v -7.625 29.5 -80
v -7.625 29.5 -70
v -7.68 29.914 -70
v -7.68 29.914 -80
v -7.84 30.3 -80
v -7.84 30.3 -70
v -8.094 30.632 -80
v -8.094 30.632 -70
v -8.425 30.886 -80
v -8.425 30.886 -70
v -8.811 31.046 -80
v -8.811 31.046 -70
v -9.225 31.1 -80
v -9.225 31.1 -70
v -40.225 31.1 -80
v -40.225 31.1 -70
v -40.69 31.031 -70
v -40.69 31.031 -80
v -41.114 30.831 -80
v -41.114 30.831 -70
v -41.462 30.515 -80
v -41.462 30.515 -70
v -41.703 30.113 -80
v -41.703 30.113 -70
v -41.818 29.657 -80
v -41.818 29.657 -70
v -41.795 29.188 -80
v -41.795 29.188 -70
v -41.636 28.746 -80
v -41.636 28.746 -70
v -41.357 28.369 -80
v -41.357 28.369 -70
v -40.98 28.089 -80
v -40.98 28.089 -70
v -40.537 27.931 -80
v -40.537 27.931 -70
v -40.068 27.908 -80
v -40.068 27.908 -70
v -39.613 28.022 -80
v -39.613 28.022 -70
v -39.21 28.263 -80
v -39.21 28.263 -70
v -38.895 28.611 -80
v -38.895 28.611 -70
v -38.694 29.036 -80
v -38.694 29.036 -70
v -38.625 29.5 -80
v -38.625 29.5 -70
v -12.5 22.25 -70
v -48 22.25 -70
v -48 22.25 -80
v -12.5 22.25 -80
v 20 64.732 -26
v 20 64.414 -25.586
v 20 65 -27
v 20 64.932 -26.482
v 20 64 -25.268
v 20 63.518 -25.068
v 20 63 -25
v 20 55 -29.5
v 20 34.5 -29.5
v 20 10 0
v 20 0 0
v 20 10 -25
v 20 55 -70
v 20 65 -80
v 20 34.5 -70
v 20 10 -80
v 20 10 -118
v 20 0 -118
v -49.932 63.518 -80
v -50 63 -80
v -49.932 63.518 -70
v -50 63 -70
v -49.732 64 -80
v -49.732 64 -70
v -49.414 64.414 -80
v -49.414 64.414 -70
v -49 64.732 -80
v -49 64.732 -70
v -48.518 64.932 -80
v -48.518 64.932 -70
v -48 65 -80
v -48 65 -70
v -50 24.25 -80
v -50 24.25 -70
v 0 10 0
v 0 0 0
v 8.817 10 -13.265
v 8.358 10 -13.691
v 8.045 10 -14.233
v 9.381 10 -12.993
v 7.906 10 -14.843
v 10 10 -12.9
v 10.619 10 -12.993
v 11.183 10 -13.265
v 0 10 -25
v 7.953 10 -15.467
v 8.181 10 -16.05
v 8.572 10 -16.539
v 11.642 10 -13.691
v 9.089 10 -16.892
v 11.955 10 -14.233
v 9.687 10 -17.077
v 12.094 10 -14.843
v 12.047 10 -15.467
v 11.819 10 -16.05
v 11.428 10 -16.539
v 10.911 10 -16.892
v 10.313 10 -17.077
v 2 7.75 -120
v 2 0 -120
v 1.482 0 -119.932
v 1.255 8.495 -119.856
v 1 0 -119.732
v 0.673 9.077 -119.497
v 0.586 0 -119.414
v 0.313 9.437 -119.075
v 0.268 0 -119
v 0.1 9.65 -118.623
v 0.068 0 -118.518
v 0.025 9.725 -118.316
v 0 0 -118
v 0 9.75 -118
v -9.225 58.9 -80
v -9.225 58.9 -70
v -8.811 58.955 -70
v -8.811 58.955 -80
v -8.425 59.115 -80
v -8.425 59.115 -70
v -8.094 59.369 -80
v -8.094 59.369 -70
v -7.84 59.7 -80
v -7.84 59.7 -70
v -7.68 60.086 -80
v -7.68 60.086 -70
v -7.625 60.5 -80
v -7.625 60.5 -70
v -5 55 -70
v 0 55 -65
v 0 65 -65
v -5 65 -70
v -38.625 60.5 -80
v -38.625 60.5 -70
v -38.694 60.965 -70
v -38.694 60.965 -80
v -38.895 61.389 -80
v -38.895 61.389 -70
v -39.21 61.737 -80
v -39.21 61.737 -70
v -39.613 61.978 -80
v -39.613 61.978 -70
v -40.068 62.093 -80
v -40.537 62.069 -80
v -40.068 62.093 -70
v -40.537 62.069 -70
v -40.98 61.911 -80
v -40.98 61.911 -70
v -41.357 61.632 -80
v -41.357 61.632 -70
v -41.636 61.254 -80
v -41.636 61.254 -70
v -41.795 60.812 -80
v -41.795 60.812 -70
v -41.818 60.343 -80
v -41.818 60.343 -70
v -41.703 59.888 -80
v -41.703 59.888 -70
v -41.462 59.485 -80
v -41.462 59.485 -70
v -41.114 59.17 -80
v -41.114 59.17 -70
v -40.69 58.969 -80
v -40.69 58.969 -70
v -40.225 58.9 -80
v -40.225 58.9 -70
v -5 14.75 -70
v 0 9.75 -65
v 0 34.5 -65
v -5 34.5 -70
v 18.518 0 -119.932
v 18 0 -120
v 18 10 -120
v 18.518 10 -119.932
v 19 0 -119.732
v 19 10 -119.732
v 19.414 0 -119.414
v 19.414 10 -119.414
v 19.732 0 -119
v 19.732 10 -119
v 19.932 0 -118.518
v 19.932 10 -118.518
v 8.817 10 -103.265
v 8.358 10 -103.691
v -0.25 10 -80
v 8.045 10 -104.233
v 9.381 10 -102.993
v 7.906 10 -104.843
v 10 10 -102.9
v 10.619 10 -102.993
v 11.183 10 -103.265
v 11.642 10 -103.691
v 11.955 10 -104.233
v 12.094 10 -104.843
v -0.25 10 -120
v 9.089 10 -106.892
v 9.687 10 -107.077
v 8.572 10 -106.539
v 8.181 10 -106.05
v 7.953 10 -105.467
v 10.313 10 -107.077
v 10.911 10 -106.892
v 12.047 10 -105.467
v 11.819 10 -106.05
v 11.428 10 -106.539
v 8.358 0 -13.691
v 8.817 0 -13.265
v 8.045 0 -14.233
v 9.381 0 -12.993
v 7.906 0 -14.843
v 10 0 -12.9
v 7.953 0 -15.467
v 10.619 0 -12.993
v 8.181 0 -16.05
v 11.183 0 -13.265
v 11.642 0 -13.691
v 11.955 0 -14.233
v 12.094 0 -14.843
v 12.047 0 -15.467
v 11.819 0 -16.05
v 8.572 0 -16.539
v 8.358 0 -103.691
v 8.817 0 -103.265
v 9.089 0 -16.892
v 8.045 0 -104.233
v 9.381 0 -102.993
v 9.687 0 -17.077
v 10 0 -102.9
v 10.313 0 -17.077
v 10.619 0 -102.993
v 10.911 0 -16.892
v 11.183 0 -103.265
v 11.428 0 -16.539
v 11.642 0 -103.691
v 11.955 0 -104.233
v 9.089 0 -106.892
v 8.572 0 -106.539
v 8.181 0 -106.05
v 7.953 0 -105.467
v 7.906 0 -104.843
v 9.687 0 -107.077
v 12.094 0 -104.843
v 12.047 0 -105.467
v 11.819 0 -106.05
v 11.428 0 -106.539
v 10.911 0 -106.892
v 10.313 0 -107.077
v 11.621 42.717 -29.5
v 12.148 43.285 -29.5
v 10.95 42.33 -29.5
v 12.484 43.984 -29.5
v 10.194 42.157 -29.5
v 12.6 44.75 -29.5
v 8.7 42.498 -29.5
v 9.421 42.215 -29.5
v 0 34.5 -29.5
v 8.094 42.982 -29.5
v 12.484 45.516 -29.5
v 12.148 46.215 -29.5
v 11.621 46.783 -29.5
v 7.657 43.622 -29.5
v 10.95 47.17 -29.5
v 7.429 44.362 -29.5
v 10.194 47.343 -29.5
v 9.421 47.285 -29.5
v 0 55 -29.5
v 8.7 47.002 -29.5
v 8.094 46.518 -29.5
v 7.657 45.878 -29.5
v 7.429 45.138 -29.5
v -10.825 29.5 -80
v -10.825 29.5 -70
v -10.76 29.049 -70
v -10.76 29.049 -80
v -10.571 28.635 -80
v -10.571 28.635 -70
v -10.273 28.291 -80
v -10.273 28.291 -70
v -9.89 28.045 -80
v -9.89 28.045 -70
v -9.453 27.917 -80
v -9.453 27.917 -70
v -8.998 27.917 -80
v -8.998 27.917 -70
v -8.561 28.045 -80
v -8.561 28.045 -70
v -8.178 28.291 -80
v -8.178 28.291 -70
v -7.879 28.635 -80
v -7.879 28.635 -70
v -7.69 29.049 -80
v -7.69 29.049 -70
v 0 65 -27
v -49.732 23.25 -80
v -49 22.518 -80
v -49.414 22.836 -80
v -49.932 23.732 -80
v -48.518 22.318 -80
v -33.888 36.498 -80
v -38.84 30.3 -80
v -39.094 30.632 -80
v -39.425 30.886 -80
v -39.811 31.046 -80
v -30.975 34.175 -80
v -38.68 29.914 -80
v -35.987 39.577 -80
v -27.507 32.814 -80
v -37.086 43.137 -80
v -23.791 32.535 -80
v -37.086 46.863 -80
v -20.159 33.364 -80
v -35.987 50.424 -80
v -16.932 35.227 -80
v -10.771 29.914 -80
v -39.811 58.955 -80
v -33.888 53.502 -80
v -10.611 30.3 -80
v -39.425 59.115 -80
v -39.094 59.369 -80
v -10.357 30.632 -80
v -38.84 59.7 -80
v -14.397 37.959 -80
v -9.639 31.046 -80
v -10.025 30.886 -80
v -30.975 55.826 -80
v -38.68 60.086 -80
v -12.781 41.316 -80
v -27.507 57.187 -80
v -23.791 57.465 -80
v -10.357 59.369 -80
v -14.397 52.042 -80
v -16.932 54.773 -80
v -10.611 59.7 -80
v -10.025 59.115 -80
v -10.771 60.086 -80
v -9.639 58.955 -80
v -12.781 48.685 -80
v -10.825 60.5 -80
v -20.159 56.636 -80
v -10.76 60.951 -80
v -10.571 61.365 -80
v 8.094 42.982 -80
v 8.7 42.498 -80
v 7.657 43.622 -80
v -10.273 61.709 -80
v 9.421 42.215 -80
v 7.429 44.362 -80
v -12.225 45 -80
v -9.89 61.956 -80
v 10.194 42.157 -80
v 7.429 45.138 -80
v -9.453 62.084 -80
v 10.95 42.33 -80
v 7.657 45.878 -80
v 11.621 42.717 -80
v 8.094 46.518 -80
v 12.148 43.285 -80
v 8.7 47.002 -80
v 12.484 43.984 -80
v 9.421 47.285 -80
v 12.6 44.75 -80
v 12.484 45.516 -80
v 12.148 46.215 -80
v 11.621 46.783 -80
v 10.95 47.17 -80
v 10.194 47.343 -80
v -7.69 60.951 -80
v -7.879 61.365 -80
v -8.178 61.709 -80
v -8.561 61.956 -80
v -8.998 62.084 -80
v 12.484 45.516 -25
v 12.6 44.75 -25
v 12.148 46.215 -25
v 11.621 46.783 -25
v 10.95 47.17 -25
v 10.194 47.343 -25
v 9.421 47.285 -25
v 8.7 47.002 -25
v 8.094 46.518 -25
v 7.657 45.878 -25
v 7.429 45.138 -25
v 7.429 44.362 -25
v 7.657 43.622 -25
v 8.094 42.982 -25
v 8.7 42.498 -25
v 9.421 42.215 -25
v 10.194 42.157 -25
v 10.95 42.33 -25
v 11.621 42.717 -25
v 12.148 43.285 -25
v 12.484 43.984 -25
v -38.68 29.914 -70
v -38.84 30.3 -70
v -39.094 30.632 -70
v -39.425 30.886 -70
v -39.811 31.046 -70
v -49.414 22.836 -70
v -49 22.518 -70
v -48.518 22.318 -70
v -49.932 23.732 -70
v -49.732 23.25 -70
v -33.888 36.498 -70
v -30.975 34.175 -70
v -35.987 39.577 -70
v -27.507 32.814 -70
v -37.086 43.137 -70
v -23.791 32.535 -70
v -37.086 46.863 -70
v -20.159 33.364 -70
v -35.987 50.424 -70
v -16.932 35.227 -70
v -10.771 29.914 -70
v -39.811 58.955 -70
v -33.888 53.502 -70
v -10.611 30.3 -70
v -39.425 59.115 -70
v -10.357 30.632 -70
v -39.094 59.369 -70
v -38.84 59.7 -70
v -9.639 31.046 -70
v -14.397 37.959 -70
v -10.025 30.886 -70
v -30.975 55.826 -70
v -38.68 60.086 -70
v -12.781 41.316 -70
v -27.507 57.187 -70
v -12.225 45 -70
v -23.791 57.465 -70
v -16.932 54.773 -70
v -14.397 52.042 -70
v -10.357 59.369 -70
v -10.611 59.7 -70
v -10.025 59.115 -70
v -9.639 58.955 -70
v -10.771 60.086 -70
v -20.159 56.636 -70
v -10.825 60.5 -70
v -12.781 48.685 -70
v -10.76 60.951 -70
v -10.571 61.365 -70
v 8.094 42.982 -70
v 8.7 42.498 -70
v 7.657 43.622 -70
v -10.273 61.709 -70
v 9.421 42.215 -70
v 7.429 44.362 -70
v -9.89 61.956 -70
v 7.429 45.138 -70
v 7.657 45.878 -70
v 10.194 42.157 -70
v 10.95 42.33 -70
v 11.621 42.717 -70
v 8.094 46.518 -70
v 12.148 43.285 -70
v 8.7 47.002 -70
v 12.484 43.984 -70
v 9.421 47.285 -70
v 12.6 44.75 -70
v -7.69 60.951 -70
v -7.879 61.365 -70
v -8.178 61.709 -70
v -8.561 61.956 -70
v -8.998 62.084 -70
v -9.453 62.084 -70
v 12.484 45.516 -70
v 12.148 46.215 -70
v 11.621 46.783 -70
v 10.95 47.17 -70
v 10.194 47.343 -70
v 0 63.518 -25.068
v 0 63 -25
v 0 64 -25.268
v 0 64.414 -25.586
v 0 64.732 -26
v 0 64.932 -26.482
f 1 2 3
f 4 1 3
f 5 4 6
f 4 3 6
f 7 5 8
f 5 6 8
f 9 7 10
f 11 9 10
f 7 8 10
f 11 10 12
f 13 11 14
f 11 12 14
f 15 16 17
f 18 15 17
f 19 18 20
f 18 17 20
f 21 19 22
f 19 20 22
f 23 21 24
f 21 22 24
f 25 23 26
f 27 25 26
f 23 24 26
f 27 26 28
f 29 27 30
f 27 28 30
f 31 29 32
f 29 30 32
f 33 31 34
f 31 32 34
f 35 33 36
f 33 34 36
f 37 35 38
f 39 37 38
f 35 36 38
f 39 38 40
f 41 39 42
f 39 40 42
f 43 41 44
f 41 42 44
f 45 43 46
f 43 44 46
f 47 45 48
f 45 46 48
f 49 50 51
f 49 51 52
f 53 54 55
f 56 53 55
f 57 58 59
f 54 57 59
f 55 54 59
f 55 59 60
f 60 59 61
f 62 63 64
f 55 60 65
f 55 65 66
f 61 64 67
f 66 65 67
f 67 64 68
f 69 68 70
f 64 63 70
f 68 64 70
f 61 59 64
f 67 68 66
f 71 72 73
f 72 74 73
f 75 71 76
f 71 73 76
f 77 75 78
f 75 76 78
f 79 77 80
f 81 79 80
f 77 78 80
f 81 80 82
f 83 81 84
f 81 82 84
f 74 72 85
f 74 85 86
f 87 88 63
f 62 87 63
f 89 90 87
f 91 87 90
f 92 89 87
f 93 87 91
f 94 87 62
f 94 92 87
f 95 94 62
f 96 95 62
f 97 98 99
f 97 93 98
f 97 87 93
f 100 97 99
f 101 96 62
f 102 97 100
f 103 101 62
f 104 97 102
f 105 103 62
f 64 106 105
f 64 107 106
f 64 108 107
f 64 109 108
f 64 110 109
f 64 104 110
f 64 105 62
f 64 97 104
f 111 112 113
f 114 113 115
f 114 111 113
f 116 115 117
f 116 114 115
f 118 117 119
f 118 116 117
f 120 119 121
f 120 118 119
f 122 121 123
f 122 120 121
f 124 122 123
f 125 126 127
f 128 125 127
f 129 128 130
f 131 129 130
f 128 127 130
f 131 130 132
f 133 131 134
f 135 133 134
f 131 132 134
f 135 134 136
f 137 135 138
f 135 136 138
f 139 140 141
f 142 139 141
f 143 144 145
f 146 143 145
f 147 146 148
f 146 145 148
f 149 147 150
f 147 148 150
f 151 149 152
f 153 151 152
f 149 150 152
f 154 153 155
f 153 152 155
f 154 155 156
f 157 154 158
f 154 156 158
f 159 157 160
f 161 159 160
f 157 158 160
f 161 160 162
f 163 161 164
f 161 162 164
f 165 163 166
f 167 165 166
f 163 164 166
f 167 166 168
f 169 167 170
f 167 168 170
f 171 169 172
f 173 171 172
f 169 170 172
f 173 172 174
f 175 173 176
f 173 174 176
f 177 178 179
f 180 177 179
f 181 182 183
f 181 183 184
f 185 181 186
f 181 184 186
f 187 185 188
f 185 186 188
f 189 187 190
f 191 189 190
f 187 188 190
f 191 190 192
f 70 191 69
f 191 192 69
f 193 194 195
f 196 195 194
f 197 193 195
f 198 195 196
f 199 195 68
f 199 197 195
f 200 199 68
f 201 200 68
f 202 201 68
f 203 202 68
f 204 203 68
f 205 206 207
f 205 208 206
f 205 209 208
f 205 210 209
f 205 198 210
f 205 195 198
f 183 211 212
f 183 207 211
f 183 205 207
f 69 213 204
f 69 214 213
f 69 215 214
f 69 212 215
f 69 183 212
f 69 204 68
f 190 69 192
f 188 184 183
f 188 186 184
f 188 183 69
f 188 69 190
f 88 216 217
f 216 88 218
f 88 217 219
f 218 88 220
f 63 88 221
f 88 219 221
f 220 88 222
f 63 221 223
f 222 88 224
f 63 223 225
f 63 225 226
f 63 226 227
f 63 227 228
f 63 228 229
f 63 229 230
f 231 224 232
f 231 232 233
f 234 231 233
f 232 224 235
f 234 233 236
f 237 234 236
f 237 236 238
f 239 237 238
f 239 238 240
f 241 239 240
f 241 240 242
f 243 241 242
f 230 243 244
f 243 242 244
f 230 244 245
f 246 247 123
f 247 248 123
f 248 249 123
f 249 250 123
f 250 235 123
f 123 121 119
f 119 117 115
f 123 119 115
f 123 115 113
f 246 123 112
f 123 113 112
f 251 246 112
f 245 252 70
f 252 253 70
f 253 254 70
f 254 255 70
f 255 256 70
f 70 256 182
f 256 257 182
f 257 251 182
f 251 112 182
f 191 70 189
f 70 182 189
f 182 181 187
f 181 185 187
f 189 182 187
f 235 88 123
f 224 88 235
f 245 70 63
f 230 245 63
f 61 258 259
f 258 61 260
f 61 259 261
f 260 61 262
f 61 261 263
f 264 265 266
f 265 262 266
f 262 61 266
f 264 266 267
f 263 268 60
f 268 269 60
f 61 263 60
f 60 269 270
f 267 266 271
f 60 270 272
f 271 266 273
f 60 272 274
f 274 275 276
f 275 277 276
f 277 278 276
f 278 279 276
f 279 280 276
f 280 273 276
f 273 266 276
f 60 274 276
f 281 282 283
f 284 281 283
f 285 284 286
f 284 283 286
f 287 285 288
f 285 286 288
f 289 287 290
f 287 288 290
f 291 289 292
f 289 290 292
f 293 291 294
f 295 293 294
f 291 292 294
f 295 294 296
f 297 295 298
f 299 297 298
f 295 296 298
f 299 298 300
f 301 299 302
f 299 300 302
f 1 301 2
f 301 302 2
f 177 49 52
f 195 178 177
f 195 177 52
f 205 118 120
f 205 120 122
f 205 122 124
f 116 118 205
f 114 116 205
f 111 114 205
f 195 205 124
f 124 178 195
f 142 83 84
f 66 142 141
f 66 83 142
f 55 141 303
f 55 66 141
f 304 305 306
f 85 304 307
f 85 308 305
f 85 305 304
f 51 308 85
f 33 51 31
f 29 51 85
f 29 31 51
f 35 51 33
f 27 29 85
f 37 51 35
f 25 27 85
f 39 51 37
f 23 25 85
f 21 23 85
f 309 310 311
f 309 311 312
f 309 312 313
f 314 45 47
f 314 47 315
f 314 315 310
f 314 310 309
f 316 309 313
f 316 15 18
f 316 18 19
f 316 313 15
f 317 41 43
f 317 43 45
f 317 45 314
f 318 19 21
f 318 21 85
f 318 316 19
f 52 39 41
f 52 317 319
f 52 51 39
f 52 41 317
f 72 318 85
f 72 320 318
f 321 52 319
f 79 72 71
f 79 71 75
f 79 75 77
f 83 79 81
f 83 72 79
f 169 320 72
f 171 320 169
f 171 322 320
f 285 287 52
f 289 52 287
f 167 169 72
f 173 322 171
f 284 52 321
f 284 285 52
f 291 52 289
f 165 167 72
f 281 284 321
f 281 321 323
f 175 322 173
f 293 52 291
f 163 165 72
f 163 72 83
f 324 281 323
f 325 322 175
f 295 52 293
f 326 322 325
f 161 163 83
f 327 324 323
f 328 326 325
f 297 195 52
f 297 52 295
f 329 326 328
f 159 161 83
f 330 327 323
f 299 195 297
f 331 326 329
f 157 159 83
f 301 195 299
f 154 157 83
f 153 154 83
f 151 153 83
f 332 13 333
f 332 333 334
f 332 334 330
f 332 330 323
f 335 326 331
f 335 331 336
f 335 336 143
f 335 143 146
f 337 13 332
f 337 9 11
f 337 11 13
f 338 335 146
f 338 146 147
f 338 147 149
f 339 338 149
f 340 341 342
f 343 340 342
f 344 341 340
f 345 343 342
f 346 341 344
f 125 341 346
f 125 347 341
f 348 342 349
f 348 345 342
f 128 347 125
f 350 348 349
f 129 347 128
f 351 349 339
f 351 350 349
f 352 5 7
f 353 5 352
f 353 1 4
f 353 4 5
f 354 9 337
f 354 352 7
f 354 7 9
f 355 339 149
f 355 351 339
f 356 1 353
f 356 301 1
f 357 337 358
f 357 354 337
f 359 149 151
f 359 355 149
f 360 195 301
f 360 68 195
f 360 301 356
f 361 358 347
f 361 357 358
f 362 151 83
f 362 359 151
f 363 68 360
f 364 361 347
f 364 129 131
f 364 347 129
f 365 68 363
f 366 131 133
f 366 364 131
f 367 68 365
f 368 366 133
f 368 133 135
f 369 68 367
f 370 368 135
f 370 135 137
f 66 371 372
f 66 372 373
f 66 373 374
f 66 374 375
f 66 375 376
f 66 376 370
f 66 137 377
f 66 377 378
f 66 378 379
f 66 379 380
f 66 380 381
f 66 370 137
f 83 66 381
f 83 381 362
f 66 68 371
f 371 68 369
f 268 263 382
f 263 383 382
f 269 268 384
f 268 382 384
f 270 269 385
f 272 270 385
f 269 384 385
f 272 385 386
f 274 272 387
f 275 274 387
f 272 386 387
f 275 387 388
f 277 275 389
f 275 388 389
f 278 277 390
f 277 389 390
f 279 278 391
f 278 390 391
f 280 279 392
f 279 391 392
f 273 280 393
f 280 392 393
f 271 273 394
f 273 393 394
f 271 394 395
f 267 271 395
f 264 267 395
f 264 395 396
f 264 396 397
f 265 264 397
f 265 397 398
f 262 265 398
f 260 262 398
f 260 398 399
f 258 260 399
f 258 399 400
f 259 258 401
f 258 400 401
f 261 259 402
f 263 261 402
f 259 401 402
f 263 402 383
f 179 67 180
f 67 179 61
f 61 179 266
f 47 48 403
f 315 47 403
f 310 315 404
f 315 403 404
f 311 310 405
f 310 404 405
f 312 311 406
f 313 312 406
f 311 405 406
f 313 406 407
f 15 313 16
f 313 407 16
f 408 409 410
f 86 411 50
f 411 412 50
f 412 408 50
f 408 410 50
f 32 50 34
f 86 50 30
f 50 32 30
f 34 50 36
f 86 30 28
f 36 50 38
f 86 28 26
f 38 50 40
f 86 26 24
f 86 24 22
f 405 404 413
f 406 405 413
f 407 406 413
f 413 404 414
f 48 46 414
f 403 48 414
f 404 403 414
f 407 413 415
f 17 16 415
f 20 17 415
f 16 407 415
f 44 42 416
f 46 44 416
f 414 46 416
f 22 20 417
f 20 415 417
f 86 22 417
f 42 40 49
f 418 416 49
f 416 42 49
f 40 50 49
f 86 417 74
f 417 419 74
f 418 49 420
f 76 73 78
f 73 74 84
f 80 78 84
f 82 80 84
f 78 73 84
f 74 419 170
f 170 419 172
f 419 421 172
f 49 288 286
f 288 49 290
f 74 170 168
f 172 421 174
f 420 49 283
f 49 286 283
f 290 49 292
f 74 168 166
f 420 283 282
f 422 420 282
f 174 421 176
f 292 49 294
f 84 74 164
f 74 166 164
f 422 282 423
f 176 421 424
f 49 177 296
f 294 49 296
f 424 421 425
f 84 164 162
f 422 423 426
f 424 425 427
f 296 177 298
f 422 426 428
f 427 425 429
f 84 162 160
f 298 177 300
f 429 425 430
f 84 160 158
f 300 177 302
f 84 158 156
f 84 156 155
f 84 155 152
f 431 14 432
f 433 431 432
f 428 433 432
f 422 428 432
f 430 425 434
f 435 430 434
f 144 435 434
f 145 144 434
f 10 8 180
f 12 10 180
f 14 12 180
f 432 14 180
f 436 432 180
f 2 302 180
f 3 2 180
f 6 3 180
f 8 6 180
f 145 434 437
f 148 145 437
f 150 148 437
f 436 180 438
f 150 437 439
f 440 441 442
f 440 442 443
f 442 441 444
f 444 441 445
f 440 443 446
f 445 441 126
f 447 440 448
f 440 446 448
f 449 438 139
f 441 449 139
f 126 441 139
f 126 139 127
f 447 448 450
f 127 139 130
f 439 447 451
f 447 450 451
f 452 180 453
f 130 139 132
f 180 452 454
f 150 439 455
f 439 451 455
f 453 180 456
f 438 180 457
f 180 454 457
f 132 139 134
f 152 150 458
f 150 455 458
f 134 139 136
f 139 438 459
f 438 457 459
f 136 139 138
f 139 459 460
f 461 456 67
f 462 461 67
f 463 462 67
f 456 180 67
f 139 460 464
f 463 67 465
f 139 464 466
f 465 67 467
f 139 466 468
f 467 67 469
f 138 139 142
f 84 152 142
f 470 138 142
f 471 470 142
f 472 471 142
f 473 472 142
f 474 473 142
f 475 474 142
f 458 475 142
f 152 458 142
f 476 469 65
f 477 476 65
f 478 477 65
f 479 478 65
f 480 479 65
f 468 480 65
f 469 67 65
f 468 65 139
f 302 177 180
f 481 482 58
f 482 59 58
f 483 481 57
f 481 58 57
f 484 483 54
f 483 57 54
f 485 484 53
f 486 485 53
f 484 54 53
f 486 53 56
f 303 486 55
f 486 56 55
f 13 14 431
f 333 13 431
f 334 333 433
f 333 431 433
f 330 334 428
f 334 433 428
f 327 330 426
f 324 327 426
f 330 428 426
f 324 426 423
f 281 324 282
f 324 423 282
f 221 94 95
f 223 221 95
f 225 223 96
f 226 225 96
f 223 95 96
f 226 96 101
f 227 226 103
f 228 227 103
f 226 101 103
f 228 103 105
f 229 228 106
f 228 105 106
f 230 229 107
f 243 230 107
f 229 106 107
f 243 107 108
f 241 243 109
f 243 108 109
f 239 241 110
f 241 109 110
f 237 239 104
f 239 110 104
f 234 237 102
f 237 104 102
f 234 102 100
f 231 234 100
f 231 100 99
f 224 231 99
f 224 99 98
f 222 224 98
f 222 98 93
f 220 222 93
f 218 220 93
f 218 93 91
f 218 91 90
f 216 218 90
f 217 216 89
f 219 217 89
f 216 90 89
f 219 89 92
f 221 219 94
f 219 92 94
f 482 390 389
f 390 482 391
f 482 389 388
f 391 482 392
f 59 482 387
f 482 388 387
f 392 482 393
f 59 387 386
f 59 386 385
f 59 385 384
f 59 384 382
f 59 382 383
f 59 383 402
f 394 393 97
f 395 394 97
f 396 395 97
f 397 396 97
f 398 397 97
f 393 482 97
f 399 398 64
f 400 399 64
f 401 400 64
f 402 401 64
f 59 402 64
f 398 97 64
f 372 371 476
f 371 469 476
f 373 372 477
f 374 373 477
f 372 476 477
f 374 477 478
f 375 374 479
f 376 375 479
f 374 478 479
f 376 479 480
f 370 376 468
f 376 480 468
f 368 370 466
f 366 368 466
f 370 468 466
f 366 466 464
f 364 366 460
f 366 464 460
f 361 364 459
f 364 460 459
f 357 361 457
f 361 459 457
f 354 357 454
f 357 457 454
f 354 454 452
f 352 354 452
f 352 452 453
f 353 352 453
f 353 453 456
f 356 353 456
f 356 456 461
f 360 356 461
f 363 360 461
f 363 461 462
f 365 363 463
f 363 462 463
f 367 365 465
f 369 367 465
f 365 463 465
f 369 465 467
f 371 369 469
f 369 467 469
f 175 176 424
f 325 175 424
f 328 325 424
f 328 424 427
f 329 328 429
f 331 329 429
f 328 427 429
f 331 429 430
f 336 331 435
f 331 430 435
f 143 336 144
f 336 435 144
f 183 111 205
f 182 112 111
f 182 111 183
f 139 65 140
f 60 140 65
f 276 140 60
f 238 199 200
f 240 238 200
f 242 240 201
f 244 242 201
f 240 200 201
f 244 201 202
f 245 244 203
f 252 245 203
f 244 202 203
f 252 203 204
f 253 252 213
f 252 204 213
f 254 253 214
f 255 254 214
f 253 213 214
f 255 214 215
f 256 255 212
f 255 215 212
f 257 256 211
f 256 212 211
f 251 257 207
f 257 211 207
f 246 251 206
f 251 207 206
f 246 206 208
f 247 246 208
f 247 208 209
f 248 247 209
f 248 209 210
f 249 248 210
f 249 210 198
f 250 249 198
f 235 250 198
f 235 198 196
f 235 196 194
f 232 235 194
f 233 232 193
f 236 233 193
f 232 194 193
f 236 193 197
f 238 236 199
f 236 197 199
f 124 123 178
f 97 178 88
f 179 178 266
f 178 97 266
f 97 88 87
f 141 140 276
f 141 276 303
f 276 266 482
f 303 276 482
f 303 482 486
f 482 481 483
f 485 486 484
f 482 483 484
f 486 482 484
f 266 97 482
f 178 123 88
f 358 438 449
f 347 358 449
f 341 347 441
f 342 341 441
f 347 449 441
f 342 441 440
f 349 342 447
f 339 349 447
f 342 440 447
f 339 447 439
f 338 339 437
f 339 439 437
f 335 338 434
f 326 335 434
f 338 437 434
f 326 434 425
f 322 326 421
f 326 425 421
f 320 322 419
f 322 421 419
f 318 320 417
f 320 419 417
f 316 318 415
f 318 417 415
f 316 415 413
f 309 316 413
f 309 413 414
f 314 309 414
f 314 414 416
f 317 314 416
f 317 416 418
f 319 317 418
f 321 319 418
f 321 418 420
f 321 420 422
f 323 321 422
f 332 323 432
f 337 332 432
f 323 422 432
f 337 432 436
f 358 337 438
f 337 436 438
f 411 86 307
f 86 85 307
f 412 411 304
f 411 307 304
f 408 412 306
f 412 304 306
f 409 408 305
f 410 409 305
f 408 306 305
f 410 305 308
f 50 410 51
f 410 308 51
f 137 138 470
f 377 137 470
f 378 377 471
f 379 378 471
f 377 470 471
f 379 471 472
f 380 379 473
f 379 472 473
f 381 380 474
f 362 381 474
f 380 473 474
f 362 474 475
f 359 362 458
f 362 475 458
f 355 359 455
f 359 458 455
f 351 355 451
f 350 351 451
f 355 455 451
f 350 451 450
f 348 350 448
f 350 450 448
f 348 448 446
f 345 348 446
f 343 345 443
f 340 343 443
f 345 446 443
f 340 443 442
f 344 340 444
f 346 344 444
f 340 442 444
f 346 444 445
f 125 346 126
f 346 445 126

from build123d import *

# Parameters (mm, degrees)
SKETCH4_W           = 20
SKETCH4_H           = 120
BOSS_EXTRUDE4_DEPTH = 10
SKETCH5_R           = 2.1
CUT_EXTRUDE1_DEPTH  = 10
SKETCH8_W           = 20
SKETCH8_H           = 55
BOSS_EXTRUDE6_DEPTH = 55
SKETCH9_W           = 40.5
SKETCH9_H           = 20.5
CUT_EXTRUDE2_DEPTH  = 20
SKETCH11_R          = 2.6
CUT_EXTRUDE3_DEPTH  = 50
SKETCH12_W          = 10
SKETCH12_H          = 55
BOSS_EXTRUDE7_DEPTH = 50
SKETCH15_R          = 12.5
CUT_EXTRUDE4_DEPTH  = 10
SKETCH17_W          = 50
SKETCH17_H          = 12.25
CUT_EXTRUDE6_DEPTH  = 10
CHAMFER1_SIZE       = 12.5
FILLET1_R           = 2
CHAMFER2_SIZE       = 5


with BuildPart() as part:
    # Sketch4 → Boss-Extrude4 (new body)
    with BuildSketch(Plane(origin=(0, 0, 0), x_dir=(1, 0, 0), z_dir=(0, 1, 0))):
        with Locations((10, 60)):
            Rectangle(SKETCH4_W, SKETCH4_H)
    extrude(amount=BOSS_EXTRUDE4_DEPTH)

    # Sketch5 → Cut-Extrude1 (cut)
    with BuildSketch(Plane(origin=(0, 10, 0), x_dir=(1, 0, 0), z_dir=(0, 1, 0))):
        with Locations(Location((10, 105, 0), (0, 0, 270))):
            Circle(SKETCH5_R)
        with Locations(Location((10, 15, 0), (0, 0, 270))):
            Circle(SKETCH5_R)
    extrude(amount=-CUT_EXTRUDE1_DEPTH, mode=Mode.SUBTRACT)

    # Sketch8 → Boss-Extrude6 (add)
    with BuildSketch(Plane(origin=(0, 10, 0), x_dir=(1, 0, 0), z_dir=(0, 1, 0))):
        with Locations((10, 52.5)):
            Rectangle(SKETCH8_W, SKETCH8_H)
    extrude(amount=BOSS_EXTRUDE6_DEPTH)

    # Sketch9 → Cut-Extrude2 (cut)
    with BuildSketch(Plane.ZY):
        with Locations((-49.75, 44.75)):
            Rectangle(SKETCH9_W, SKETCH9_H)
    extrude(amount=-CUT_EXTRUDE2_DEPTH, mode=Mode.SUBTRACT)

    # Sketch11 → Cut-Extrude3 (cut, symmetric)
    with BuildSketch(Plane.XY.offset(-70)):
        with Locations((10, 44.75)):
            Circle(SKETCH11_R)
    extrude(amount=CUT_EXTRUDE3_DEPTH, both=True, mode=Mode.SUBTRACT)

    # Sketch12 → Boss-Extrude7 (add)
    with BuildSketch(Plane.ZY):
        with Locations((-75, 37.5)):
            Rectangle(SKETCH12_W, SKETCH12_H)
    extrude(amount=BOSS_EXTRUDE7_DEPTH)

    # Sketch15 → Cut-Extrude4 (cut)
    with BuildSketch(Plane.XY.offset(-70)):
        with Locations((-24.72528445, 45.000219356)):
            Circle(SKETCH15_R)
        with BuildLine():
            ThreePointArc((-7.62528445, 60.500219356), (-9.22528445, 62.100219356), (-10.82528445, 60.500219356))
            Line((-10.82528445, 60.500219356), (-9.22528445, 60.500219356))
            Line((-9.22528445, 60.500219356), (-9.22528445, 58.900219356))
            ThreePointArc((-9.22528445, 58.900219356), (-8.0939136, 59.368848506), (-7.62528445, 60.500219356))
        make_face()
        with BuildLine():
            Line((-9.22528445, 60.500219356), (-10.82528445, 60.500219356))
            ThreePointArc((-10.82528445, 60.500219356), (-10.3566553, 59.368848506), (-9.22528445, 58.900219356))
            Line((-9.22528445, 58.900219356), (-9.22528445, 60.500219356))
        make_face()
        with BuildLine():
            ThreePointArc((-7.62528445, 29.500219356), (-8.0939136, 30.631590206), (-9.22528445, 31.100219356))
            Line((-9.22528445, 31.100219356), (-9.22528445, 29.500219356))
            Line((-9.22528445, 29.500219356), (-10.82528445, 29.500219356))
            ThreePointArc((-10.82528445, 29.500219356), (-9.22528445, 27.900219356), (-7.62528445, 29.500219356))
        make_face()
        with BuildLine():
            Line((-9.22528445, 29.500219356), (-9.22528445, 31.100219356))
            ThreePointArc((-9.22528445, 31.100219356), (-10.3566553, 30.631590206), (-10.82528445, 29.500219356))
            Line((-10.82528445, 29.500219356), (-9.22528445, 29.500219356))
        make_face()
        with BuildLine():
            ThreePointArc((-38.62528445, 29.500219356), (-39.0939136, 30.631590206), (-40.22528445, 31.100219356))
            Line((-40.22528445, 31.100219356), (-40.22528445, 29.500219356))
            Line((-40.22528445, 29.500219356), (-38.62528445, 29.500219356))
        make_face()
        with BuildLine():
            Line((-40.22528445, 29.500219356), (-40.22528445, 31.100219356))
            ThreePointArc((-40.22528445, 31.100219356), (-41.3566553, 28.368848506), (-38.62528445, 29.500219356))
            Line((-38.62528445, 29.500219356), (-40.22528445, 29.500219356))
        make_face()
        with BuildLine():
            Line((-40.22528445, 58.900219356), (-40.22528445, 60.500219356))
            Line((-40.22528445, 60.500219356), (-38.62528445, 60.500219356))
            ThreePointArc((-38.62528445, 60.500219356), (-41.3566553, 61.631590206), (-40.22528445, 58.900219356))
        make_face()
        with BuildLine():
            Line((-38.62528445, 60.500219356), (-40.22528445, 60.500219356))
            Line((-40.22528445, 60.500219356), (-40.22528445, 58.900219356))
            ThreePointArc((-40.22528445, 58.900219356), (-39.0939136, 59.368848506), (-38.62528445, 60.500219356))
        make_face()
    extrude(amount=-CUT_EXTRUDE4_DEPTH, mode=Mode.SUBTRACT)

    # Sketch17 → Cut-Extrude6 (cut)
    with BuildSketch(Plane.XY.offset(-70)):
        with Locations((-25, 16.125)):
            Rectangle(SKETCH17_W, SKETCH17_H)
    extrude(amount=-CUT_EXTRUDE6_DEPTH, mode=Mode.SUBTRACT)

    # Chamfer1
    chamfer1_edges = [part.edges().sort_by_distance(p)[0] for p in [
        (0, 22.25, -75),
    ]]
    chamfer(chamfer1_edges, length=CHAMFER1_SIZE)

    # Fillet1
    fillet1_edges = [part.edges().sort_by_distance(p)[0] for p in [
        (-50, 22.25, -75),
        (0, 4.875, -120),
        (10, 65, -25),
        (-50, 65, -75),
        (20, 5, -120),
    ]]
    fillet(fillet1_edges, radius=FILLET1_R)

    # Chamfer2
    chamfer2_edges = [part.edges().sort_by_distance(p)[0] for p in [
        (0, 22.125, -70),
        (0, 60, -70),
    ]]
    chamfer(chamfer2_edges, length=CHAMFER2_SIZE)


solid = part.part
